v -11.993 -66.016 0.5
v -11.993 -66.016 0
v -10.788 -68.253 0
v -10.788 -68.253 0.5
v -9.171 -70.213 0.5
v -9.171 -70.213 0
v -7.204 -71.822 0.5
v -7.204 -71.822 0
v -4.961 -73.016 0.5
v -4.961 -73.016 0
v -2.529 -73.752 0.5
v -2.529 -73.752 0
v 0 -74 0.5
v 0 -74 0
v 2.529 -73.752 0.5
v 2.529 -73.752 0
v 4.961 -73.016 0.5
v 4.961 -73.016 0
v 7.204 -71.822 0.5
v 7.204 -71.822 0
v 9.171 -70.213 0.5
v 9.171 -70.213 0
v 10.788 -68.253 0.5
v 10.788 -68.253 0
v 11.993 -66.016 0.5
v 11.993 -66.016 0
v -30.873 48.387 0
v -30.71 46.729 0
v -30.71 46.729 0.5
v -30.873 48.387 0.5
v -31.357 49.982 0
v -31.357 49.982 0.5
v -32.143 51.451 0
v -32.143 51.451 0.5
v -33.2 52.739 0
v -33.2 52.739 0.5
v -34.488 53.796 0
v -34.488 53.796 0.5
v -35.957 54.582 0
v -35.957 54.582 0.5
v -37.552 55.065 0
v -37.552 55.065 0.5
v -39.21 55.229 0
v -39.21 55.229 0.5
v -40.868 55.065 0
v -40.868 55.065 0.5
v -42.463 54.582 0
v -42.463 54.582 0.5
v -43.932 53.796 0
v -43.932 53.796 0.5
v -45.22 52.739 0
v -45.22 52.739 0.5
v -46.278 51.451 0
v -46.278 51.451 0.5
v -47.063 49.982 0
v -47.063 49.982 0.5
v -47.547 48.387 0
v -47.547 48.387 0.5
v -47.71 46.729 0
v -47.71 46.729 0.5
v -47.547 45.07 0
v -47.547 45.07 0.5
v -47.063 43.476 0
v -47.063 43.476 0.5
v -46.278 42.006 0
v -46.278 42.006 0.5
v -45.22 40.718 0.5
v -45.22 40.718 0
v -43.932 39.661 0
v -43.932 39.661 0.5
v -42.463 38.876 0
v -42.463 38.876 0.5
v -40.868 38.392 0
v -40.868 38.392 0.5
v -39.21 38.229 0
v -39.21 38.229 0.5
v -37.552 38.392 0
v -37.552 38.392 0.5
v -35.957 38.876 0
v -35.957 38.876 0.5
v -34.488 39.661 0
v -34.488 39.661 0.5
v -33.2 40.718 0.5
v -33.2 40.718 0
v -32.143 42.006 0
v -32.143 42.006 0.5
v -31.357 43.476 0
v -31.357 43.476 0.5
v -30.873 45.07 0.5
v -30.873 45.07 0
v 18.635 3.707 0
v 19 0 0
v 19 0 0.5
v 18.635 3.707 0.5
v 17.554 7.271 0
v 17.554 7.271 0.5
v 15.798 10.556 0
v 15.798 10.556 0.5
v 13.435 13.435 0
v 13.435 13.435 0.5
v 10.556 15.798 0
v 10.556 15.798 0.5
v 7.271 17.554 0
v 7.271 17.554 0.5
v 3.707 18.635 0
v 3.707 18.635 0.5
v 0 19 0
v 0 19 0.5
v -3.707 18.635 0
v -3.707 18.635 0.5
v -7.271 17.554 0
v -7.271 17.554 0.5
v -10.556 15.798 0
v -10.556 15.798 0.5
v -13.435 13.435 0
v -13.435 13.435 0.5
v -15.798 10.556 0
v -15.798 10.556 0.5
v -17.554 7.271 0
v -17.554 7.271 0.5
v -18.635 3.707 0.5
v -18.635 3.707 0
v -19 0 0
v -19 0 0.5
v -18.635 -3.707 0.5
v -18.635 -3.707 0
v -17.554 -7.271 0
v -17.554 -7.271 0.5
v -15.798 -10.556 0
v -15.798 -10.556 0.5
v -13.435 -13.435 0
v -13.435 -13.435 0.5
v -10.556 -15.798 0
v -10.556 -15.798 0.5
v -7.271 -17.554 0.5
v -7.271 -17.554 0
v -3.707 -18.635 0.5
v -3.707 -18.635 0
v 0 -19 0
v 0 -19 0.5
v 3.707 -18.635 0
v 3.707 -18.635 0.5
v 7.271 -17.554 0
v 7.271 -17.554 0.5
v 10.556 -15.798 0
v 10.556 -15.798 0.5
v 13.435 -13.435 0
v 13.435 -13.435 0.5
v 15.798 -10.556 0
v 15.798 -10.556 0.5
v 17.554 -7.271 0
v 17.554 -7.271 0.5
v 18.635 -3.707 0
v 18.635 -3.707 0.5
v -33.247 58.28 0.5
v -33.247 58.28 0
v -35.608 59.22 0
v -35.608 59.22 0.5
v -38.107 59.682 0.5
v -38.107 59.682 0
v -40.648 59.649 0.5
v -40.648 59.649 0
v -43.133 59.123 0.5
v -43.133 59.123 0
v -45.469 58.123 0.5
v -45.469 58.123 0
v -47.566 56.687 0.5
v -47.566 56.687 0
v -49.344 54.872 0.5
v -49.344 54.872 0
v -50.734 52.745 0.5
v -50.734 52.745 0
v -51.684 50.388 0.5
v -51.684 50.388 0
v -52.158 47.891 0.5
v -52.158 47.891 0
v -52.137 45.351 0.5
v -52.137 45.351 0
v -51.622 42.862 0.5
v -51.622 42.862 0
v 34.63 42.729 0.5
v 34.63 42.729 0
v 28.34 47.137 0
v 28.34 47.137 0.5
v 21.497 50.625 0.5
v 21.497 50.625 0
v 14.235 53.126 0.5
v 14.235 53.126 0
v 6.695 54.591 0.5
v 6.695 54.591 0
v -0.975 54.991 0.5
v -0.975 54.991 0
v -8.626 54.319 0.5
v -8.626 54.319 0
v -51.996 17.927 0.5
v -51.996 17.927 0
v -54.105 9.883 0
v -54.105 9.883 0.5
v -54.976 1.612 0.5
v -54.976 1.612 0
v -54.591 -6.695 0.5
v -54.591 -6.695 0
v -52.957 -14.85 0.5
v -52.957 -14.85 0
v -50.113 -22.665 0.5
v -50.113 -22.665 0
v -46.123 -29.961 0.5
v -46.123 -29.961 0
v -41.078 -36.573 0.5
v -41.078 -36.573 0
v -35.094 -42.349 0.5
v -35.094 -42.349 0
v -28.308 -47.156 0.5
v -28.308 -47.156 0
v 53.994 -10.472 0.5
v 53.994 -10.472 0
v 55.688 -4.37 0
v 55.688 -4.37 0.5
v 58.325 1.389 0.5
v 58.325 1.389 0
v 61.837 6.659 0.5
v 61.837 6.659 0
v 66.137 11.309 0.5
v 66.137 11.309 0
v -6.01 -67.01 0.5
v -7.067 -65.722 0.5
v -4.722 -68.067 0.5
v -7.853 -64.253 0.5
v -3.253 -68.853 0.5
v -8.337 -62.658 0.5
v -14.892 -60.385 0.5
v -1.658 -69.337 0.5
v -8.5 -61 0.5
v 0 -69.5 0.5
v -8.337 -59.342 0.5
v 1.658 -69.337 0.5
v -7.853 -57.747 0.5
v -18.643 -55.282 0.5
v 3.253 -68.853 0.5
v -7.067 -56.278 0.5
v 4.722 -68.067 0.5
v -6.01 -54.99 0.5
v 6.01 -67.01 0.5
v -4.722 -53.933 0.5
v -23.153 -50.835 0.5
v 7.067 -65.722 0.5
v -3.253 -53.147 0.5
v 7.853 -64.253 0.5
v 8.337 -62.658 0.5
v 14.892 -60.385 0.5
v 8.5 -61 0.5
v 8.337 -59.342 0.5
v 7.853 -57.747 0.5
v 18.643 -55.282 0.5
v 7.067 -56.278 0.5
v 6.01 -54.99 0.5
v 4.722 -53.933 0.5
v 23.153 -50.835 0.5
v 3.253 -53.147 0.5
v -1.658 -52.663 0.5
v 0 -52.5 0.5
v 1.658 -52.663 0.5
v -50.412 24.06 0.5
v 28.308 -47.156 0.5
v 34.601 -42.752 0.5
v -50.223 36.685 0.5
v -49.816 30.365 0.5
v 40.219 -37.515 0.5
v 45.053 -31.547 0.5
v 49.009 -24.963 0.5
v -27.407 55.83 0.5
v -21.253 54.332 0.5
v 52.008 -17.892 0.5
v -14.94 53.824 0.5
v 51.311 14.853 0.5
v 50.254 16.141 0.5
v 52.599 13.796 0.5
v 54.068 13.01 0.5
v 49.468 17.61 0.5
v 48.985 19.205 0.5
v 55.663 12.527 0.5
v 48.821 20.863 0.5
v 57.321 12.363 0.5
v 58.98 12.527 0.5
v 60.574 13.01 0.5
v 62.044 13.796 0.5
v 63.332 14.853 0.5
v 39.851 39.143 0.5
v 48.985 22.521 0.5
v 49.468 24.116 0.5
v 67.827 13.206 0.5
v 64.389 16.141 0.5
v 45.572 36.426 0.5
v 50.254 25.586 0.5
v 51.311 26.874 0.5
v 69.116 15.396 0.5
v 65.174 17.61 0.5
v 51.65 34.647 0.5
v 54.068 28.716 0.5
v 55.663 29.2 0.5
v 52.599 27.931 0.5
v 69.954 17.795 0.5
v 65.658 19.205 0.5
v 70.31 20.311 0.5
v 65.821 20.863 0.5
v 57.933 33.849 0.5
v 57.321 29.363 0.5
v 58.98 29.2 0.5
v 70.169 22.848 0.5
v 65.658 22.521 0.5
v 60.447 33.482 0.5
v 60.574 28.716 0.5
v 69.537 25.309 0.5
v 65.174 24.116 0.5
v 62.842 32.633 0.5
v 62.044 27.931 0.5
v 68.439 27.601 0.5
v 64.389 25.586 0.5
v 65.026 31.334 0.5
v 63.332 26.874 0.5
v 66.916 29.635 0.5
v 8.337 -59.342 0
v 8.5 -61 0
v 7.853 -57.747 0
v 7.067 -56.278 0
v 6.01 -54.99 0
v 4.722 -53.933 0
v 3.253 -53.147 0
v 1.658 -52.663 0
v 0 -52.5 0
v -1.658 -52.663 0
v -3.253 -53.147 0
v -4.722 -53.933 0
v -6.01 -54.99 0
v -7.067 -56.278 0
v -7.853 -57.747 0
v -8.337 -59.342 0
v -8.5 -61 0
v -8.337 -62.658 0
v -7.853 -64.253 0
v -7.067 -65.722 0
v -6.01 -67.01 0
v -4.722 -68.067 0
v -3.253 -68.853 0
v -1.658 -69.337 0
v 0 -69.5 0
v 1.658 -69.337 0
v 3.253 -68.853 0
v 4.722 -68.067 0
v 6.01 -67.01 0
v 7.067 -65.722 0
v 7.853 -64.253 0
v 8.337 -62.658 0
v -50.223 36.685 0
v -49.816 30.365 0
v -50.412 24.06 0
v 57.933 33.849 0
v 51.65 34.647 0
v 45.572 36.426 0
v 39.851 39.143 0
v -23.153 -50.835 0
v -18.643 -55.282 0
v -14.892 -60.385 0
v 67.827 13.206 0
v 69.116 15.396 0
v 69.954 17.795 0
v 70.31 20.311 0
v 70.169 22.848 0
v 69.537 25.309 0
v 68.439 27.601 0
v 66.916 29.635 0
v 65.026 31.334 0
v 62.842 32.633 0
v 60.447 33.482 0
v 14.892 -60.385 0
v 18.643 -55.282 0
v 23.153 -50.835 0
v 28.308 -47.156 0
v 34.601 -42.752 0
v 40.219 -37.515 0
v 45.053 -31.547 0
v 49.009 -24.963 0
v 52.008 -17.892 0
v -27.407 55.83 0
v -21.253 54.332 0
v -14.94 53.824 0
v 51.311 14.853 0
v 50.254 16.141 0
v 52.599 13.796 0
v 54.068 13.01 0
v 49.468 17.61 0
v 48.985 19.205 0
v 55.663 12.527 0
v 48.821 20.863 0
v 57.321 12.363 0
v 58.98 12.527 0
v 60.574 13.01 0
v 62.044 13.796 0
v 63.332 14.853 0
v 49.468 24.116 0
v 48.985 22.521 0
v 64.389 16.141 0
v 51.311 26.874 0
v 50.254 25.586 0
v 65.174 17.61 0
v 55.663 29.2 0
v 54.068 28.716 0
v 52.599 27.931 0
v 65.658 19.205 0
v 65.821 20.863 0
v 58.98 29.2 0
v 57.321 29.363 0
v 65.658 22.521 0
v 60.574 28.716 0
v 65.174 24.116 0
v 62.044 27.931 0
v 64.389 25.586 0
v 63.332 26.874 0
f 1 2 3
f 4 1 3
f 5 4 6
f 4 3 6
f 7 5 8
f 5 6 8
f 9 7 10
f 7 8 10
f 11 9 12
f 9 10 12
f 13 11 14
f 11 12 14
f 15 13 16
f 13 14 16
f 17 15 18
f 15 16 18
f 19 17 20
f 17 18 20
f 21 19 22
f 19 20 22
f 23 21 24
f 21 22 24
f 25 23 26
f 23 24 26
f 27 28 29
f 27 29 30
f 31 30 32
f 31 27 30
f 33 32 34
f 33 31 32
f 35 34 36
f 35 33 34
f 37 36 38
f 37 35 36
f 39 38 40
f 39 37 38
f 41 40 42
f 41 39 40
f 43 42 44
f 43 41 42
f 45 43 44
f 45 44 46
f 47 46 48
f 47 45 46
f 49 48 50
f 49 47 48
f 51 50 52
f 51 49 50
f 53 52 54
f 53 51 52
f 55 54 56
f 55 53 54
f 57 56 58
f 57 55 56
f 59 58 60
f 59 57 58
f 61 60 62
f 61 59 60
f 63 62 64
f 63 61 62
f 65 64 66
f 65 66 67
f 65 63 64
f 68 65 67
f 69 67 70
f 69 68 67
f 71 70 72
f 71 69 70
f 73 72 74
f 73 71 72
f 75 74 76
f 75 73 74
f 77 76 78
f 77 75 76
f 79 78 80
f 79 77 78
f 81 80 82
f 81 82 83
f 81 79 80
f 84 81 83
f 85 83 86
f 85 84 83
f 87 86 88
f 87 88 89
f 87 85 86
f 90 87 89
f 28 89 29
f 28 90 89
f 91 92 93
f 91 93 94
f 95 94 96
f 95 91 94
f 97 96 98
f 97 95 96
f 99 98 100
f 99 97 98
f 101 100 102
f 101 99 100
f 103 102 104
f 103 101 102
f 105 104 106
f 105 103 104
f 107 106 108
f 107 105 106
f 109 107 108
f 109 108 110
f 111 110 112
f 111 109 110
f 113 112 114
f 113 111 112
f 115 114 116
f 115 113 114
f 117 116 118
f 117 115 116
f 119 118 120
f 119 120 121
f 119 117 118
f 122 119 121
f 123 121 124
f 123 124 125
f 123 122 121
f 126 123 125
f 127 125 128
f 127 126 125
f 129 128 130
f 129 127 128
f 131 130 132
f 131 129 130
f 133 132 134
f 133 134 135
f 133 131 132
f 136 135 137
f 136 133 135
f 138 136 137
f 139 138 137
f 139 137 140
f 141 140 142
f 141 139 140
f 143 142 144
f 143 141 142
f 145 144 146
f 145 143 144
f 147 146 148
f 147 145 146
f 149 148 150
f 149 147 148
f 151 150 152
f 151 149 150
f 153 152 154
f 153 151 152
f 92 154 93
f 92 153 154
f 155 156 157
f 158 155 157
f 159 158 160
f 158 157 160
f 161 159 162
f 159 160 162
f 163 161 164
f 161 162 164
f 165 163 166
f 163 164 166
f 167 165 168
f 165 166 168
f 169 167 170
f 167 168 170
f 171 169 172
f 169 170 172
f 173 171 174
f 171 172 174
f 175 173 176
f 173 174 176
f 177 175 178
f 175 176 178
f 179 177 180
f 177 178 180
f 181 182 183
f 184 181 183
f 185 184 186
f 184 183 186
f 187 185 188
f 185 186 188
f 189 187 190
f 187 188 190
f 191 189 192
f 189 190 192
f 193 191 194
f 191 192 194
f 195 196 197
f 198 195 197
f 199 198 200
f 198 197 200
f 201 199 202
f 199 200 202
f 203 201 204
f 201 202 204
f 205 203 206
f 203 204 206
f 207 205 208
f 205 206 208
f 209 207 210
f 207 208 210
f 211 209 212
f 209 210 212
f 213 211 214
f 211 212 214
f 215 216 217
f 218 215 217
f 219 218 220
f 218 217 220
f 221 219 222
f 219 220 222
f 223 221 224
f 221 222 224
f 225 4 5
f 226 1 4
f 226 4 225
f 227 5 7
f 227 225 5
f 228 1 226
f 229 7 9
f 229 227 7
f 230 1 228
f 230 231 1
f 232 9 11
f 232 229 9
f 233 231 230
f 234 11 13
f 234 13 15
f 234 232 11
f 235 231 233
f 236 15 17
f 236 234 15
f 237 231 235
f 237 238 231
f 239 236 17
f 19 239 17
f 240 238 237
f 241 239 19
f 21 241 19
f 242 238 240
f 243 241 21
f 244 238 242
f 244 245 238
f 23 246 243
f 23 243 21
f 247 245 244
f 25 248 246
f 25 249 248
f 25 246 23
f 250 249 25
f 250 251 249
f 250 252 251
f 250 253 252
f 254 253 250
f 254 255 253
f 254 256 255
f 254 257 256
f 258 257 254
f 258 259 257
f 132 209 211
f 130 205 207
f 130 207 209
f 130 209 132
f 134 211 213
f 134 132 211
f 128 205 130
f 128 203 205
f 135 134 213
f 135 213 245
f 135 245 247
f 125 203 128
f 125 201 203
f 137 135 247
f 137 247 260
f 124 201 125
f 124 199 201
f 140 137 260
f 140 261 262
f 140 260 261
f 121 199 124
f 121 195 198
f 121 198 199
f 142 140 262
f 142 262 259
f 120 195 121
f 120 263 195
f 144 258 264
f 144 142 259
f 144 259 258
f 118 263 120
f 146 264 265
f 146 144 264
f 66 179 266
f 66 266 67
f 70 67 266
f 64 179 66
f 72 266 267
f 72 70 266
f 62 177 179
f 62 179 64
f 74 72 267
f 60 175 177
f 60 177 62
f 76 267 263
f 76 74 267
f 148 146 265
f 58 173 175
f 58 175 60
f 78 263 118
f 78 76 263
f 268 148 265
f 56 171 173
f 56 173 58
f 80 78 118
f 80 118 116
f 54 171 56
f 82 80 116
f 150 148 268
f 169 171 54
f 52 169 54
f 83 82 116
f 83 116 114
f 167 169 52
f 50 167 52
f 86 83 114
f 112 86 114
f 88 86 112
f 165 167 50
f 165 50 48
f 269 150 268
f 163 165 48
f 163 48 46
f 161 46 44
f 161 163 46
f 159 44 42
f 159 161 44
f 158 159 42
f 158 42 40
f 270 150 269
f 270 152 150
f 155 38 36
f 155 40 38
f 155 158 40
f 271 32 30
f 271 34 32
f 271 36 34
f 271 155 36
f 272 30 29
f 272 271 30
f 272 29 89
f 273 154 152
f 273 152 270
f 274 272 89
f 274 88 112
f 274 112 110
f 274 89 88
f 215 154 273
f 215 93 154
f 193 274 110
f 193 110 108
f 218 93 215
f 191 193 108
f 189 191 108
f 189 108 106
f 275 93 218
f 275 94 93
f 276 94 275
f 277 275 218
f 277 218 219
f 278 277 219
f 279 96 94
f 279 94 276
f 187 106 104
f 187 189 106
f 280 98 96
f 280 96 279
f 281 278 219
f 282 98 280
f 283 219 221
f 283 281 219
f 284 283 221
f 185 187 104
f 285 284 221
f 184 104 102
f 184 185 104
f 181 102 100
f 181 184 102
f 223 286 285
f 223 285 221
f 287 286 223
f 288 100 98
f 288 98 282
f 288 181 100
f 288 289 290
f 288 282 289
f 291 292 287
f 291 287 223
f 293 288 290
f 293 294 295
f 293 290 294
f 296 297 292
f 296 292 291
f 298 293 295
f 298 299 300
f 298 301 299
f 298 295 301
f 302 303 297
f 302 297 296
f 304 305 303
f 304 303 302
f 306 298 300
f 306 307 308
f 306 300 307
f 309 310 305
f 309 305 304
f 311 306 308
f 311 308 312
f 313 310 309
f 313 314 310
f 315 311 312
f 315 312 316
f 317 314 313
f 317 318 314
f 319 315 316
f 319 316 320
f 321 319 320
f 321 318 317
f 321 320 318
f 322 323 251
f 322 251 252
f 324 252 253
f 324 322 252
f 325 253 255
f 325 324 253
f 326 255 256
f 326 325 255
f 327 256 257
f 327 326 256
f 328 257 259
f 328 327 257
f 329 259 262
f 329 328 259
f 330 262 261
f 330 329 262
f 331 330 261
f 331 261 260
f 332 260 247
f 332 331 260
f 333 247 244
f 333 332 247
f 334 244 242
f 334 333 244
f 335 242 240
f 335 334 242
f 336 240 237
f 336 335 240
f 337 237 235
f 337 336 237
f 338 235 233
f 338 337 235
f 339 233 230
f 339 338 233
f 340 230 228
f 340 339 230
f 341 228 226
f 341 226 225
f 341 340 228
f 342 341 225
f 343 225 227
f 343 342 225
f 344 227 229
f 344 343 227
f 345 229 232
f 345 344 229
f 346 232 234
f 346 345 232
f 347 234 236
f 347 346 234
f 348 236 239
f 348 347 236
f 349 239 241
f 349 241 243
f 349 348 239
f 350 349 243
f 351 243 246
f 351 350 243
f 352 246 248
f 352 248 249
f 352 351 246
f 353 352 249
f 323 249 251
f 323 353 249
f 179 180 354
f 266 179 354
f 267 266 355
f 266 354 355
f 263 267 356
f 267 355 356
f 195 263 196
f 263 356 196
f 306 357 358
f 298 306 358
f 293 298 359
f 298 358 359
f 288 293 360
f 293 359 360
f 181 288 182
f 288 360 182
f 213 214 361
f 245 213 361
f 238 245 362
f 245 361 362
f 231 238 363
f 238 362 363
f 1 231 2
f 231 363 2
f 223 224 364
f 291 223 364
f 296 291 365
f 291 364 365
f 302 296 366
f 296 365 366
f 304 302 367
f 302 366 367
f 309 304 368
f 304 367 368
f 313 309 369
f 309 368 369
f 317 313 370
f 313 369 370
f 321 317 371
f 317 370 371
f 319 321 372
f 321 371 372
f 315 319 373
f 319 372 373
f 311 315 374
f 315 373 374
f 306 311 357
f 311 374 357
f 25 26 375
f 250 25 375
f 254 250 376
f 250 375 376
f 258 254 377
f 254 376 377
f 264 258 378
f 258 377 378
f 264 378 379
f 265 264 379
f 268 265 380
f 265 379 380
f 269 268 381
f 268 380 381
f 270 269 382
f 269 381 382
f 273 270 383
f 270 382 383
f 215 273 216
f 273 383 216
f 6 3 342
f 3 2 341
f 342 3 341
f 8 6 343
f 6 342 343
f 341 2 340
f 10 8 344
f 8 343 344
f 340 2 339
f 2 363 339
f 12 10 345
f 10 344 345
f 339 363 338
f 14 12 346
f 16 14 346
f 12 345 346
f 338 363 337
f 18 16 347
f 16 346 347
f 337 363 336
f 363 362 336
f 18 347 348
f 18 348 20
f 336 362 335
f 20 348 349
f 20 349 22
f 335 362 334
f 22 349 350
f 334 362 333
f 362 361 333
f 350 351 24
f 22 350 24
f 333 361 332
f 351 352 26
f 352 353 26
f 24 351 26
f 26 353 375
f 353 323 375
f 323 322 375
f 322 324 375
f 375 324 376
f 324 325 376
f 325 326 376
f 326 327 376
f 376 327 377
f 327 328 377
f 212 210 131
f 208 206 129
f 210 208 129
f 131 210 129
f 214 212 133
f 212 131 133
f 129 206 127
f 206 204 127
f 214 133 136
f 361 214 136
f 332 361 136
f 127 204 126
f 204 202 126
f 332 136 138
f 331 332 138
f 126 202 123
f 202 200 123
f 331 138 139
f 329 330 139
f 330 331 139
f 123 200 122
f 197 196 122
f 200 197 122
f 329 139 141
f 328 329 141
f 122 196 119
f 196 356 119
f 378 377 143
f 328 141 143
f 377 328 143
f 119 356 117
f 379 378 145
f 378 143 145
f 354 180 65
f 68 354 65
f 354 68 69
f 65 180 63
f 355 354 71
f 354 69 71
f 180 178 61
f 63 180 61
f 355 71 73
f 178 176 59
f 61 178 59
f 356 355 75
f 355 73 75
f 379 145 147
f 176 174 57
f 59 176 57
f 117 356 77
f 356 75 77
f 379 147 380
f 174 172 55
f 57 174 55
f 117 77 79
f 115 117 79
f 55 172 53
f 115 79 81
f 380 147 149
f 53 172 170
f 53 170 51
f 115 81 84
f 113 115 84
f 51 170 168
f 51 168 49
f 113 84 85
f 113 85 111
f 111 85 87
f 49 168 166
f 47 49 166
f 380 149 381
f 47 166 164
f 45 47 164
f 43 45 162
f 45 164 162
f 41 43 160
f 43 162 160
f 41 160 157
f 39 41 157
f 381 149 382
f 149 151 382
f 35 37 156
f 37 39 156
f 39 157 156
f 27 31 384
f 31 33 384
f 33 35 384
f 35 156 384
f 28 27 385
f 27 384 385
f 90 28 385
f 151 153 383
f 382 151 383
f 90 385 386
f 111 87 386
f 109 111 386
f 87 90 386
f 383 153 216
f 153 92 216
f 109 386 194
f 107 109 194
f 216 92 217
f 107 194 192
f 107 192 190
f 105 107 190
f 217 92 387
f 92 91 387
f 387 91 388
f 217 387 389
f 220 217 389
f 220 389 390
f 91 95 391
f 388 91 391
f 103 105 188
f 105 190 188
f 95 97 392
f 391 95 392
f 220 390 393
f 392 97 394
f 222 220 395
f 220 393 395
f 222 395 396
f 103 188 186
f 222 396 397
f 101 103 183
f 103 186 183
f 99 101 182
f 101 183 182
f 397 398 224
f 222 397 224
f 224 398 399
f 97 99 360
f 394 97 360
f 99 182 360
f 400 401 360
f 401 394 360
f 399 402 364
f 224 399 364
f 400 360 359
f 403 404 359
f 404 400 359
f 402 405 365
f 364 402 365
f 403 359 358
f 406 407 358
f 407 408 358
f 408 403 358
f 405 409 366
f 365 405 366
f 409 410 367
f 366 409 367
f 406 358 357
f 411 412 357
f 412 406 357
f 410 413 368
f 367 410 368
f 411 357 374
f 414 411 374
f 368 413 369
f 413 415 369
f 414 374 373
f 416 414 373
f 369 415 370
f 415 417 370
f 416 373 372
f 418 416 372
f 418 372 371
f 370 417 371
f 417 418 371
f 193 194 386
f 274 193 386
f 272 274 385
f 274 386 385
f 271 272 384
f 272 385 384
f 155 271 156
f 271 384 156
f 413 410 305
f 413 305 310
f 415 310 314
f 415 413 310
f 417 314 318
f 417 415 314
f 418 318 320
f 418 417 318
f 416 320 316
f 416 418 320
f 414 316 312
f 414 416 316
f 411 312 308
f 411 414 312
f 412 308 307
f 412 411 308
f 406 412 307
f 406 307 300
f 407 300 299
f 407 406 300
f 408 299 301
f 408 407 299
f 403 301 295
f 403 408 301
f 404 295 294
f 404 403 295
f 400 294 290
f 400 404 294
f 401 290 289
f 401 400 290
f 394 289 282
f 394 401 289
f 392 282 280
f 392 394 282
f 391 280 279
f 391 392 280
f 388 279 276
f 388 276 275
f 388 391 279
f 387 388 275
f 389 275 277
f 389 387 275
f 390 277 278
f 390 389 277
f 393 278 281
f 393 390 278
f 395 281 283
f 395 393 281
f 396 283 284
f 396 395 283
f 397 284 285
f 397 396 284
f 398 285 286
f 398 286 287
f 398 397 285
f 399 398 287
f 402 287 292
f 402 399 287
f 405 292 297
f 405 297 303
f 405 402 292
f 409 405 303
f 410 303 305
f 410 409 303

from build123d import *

# Parameters (mm, degrees)
SKETCH1_R      = 8.5
SKETCH1_R_2    = 19
EXTRUDE1_DEPTH = 0.5


with BuildPart() as part:
    # Sketch1 → Extrude1 (new body)
    with BuildSketch(Plane.XY):
        with BuildLine():
            ThreePointArc((-11.993220936, -66.016238788), (0, -74), (11.993220936, -66.016238788))
            ThreePointArc((11.993220936, -66.016238788), (18.643198205, -55.282099515), (28.307885854, -47.155737705))
            ThreePointArc((28.307885854, -47.155737705), (45.053362436, -31.546703999), (53.993765926, -10.472499278))
            ThreePointArc((53.993765926, -10.472499278), (58.324530298, 1.388715818), (66.136895584, 11.308942239))
            ThreePointArc((66.136895584, 11.308942239), (69.537253938, 25.309490606), (57.933049297, 33.848824665))
            ThreePointArc((57.933049297, 33.848824665), (45.571831653, 36.426467381), (34.630031572, 42.728923615))
            ThreePointArc((34.630031572, 42.728923615), (14.235047481, 53.125920446), (-8.626025268, 54.319349113))
            ThreePointArc((-8.626025268, 54.319349113), (-21.253130218, 54.332161948), (-33.247080077, 58.280466697))
            ThreePointArc((-33.247080077, 58.280466697), (-47.566283117, 56.687288791), (-51.621760584, 42.862279061))
            ThreePointArc((-51.621760584, 42.862279061), (-49.816166993, 30.364928326), (-51.996222577, 17.927432547))
            ThreePointArc((-51.996222577, 17.927432547), (-51.683094143, -18.811107883), (-28.307885854, -47.155737705))
            ThreePointArc((-28.307885854, -47.155737705), (-18.643198205, -55.282099515), (-11.993220936, -66.016238788))
        make_face()
        with Locations((57.321249868, 20.863228743)):
            Circle(SKETCH1_R, mode=Mode.SUBTRACT)
        with Locations((-39.210044191, 46.72871103)):
            Circle(SKETCH1_R, mode=Mode.SUBTRACT)
        with Locations((0, -61)):
            Circle(SKETCH1_R, mode=Mode.SUBTRACT)
        Circle(SKETCH1_R_2, mode=Mode.SUBTRACT)
    extrude(amount=EXTRUDE1_DEPTH)


solid = part.part
